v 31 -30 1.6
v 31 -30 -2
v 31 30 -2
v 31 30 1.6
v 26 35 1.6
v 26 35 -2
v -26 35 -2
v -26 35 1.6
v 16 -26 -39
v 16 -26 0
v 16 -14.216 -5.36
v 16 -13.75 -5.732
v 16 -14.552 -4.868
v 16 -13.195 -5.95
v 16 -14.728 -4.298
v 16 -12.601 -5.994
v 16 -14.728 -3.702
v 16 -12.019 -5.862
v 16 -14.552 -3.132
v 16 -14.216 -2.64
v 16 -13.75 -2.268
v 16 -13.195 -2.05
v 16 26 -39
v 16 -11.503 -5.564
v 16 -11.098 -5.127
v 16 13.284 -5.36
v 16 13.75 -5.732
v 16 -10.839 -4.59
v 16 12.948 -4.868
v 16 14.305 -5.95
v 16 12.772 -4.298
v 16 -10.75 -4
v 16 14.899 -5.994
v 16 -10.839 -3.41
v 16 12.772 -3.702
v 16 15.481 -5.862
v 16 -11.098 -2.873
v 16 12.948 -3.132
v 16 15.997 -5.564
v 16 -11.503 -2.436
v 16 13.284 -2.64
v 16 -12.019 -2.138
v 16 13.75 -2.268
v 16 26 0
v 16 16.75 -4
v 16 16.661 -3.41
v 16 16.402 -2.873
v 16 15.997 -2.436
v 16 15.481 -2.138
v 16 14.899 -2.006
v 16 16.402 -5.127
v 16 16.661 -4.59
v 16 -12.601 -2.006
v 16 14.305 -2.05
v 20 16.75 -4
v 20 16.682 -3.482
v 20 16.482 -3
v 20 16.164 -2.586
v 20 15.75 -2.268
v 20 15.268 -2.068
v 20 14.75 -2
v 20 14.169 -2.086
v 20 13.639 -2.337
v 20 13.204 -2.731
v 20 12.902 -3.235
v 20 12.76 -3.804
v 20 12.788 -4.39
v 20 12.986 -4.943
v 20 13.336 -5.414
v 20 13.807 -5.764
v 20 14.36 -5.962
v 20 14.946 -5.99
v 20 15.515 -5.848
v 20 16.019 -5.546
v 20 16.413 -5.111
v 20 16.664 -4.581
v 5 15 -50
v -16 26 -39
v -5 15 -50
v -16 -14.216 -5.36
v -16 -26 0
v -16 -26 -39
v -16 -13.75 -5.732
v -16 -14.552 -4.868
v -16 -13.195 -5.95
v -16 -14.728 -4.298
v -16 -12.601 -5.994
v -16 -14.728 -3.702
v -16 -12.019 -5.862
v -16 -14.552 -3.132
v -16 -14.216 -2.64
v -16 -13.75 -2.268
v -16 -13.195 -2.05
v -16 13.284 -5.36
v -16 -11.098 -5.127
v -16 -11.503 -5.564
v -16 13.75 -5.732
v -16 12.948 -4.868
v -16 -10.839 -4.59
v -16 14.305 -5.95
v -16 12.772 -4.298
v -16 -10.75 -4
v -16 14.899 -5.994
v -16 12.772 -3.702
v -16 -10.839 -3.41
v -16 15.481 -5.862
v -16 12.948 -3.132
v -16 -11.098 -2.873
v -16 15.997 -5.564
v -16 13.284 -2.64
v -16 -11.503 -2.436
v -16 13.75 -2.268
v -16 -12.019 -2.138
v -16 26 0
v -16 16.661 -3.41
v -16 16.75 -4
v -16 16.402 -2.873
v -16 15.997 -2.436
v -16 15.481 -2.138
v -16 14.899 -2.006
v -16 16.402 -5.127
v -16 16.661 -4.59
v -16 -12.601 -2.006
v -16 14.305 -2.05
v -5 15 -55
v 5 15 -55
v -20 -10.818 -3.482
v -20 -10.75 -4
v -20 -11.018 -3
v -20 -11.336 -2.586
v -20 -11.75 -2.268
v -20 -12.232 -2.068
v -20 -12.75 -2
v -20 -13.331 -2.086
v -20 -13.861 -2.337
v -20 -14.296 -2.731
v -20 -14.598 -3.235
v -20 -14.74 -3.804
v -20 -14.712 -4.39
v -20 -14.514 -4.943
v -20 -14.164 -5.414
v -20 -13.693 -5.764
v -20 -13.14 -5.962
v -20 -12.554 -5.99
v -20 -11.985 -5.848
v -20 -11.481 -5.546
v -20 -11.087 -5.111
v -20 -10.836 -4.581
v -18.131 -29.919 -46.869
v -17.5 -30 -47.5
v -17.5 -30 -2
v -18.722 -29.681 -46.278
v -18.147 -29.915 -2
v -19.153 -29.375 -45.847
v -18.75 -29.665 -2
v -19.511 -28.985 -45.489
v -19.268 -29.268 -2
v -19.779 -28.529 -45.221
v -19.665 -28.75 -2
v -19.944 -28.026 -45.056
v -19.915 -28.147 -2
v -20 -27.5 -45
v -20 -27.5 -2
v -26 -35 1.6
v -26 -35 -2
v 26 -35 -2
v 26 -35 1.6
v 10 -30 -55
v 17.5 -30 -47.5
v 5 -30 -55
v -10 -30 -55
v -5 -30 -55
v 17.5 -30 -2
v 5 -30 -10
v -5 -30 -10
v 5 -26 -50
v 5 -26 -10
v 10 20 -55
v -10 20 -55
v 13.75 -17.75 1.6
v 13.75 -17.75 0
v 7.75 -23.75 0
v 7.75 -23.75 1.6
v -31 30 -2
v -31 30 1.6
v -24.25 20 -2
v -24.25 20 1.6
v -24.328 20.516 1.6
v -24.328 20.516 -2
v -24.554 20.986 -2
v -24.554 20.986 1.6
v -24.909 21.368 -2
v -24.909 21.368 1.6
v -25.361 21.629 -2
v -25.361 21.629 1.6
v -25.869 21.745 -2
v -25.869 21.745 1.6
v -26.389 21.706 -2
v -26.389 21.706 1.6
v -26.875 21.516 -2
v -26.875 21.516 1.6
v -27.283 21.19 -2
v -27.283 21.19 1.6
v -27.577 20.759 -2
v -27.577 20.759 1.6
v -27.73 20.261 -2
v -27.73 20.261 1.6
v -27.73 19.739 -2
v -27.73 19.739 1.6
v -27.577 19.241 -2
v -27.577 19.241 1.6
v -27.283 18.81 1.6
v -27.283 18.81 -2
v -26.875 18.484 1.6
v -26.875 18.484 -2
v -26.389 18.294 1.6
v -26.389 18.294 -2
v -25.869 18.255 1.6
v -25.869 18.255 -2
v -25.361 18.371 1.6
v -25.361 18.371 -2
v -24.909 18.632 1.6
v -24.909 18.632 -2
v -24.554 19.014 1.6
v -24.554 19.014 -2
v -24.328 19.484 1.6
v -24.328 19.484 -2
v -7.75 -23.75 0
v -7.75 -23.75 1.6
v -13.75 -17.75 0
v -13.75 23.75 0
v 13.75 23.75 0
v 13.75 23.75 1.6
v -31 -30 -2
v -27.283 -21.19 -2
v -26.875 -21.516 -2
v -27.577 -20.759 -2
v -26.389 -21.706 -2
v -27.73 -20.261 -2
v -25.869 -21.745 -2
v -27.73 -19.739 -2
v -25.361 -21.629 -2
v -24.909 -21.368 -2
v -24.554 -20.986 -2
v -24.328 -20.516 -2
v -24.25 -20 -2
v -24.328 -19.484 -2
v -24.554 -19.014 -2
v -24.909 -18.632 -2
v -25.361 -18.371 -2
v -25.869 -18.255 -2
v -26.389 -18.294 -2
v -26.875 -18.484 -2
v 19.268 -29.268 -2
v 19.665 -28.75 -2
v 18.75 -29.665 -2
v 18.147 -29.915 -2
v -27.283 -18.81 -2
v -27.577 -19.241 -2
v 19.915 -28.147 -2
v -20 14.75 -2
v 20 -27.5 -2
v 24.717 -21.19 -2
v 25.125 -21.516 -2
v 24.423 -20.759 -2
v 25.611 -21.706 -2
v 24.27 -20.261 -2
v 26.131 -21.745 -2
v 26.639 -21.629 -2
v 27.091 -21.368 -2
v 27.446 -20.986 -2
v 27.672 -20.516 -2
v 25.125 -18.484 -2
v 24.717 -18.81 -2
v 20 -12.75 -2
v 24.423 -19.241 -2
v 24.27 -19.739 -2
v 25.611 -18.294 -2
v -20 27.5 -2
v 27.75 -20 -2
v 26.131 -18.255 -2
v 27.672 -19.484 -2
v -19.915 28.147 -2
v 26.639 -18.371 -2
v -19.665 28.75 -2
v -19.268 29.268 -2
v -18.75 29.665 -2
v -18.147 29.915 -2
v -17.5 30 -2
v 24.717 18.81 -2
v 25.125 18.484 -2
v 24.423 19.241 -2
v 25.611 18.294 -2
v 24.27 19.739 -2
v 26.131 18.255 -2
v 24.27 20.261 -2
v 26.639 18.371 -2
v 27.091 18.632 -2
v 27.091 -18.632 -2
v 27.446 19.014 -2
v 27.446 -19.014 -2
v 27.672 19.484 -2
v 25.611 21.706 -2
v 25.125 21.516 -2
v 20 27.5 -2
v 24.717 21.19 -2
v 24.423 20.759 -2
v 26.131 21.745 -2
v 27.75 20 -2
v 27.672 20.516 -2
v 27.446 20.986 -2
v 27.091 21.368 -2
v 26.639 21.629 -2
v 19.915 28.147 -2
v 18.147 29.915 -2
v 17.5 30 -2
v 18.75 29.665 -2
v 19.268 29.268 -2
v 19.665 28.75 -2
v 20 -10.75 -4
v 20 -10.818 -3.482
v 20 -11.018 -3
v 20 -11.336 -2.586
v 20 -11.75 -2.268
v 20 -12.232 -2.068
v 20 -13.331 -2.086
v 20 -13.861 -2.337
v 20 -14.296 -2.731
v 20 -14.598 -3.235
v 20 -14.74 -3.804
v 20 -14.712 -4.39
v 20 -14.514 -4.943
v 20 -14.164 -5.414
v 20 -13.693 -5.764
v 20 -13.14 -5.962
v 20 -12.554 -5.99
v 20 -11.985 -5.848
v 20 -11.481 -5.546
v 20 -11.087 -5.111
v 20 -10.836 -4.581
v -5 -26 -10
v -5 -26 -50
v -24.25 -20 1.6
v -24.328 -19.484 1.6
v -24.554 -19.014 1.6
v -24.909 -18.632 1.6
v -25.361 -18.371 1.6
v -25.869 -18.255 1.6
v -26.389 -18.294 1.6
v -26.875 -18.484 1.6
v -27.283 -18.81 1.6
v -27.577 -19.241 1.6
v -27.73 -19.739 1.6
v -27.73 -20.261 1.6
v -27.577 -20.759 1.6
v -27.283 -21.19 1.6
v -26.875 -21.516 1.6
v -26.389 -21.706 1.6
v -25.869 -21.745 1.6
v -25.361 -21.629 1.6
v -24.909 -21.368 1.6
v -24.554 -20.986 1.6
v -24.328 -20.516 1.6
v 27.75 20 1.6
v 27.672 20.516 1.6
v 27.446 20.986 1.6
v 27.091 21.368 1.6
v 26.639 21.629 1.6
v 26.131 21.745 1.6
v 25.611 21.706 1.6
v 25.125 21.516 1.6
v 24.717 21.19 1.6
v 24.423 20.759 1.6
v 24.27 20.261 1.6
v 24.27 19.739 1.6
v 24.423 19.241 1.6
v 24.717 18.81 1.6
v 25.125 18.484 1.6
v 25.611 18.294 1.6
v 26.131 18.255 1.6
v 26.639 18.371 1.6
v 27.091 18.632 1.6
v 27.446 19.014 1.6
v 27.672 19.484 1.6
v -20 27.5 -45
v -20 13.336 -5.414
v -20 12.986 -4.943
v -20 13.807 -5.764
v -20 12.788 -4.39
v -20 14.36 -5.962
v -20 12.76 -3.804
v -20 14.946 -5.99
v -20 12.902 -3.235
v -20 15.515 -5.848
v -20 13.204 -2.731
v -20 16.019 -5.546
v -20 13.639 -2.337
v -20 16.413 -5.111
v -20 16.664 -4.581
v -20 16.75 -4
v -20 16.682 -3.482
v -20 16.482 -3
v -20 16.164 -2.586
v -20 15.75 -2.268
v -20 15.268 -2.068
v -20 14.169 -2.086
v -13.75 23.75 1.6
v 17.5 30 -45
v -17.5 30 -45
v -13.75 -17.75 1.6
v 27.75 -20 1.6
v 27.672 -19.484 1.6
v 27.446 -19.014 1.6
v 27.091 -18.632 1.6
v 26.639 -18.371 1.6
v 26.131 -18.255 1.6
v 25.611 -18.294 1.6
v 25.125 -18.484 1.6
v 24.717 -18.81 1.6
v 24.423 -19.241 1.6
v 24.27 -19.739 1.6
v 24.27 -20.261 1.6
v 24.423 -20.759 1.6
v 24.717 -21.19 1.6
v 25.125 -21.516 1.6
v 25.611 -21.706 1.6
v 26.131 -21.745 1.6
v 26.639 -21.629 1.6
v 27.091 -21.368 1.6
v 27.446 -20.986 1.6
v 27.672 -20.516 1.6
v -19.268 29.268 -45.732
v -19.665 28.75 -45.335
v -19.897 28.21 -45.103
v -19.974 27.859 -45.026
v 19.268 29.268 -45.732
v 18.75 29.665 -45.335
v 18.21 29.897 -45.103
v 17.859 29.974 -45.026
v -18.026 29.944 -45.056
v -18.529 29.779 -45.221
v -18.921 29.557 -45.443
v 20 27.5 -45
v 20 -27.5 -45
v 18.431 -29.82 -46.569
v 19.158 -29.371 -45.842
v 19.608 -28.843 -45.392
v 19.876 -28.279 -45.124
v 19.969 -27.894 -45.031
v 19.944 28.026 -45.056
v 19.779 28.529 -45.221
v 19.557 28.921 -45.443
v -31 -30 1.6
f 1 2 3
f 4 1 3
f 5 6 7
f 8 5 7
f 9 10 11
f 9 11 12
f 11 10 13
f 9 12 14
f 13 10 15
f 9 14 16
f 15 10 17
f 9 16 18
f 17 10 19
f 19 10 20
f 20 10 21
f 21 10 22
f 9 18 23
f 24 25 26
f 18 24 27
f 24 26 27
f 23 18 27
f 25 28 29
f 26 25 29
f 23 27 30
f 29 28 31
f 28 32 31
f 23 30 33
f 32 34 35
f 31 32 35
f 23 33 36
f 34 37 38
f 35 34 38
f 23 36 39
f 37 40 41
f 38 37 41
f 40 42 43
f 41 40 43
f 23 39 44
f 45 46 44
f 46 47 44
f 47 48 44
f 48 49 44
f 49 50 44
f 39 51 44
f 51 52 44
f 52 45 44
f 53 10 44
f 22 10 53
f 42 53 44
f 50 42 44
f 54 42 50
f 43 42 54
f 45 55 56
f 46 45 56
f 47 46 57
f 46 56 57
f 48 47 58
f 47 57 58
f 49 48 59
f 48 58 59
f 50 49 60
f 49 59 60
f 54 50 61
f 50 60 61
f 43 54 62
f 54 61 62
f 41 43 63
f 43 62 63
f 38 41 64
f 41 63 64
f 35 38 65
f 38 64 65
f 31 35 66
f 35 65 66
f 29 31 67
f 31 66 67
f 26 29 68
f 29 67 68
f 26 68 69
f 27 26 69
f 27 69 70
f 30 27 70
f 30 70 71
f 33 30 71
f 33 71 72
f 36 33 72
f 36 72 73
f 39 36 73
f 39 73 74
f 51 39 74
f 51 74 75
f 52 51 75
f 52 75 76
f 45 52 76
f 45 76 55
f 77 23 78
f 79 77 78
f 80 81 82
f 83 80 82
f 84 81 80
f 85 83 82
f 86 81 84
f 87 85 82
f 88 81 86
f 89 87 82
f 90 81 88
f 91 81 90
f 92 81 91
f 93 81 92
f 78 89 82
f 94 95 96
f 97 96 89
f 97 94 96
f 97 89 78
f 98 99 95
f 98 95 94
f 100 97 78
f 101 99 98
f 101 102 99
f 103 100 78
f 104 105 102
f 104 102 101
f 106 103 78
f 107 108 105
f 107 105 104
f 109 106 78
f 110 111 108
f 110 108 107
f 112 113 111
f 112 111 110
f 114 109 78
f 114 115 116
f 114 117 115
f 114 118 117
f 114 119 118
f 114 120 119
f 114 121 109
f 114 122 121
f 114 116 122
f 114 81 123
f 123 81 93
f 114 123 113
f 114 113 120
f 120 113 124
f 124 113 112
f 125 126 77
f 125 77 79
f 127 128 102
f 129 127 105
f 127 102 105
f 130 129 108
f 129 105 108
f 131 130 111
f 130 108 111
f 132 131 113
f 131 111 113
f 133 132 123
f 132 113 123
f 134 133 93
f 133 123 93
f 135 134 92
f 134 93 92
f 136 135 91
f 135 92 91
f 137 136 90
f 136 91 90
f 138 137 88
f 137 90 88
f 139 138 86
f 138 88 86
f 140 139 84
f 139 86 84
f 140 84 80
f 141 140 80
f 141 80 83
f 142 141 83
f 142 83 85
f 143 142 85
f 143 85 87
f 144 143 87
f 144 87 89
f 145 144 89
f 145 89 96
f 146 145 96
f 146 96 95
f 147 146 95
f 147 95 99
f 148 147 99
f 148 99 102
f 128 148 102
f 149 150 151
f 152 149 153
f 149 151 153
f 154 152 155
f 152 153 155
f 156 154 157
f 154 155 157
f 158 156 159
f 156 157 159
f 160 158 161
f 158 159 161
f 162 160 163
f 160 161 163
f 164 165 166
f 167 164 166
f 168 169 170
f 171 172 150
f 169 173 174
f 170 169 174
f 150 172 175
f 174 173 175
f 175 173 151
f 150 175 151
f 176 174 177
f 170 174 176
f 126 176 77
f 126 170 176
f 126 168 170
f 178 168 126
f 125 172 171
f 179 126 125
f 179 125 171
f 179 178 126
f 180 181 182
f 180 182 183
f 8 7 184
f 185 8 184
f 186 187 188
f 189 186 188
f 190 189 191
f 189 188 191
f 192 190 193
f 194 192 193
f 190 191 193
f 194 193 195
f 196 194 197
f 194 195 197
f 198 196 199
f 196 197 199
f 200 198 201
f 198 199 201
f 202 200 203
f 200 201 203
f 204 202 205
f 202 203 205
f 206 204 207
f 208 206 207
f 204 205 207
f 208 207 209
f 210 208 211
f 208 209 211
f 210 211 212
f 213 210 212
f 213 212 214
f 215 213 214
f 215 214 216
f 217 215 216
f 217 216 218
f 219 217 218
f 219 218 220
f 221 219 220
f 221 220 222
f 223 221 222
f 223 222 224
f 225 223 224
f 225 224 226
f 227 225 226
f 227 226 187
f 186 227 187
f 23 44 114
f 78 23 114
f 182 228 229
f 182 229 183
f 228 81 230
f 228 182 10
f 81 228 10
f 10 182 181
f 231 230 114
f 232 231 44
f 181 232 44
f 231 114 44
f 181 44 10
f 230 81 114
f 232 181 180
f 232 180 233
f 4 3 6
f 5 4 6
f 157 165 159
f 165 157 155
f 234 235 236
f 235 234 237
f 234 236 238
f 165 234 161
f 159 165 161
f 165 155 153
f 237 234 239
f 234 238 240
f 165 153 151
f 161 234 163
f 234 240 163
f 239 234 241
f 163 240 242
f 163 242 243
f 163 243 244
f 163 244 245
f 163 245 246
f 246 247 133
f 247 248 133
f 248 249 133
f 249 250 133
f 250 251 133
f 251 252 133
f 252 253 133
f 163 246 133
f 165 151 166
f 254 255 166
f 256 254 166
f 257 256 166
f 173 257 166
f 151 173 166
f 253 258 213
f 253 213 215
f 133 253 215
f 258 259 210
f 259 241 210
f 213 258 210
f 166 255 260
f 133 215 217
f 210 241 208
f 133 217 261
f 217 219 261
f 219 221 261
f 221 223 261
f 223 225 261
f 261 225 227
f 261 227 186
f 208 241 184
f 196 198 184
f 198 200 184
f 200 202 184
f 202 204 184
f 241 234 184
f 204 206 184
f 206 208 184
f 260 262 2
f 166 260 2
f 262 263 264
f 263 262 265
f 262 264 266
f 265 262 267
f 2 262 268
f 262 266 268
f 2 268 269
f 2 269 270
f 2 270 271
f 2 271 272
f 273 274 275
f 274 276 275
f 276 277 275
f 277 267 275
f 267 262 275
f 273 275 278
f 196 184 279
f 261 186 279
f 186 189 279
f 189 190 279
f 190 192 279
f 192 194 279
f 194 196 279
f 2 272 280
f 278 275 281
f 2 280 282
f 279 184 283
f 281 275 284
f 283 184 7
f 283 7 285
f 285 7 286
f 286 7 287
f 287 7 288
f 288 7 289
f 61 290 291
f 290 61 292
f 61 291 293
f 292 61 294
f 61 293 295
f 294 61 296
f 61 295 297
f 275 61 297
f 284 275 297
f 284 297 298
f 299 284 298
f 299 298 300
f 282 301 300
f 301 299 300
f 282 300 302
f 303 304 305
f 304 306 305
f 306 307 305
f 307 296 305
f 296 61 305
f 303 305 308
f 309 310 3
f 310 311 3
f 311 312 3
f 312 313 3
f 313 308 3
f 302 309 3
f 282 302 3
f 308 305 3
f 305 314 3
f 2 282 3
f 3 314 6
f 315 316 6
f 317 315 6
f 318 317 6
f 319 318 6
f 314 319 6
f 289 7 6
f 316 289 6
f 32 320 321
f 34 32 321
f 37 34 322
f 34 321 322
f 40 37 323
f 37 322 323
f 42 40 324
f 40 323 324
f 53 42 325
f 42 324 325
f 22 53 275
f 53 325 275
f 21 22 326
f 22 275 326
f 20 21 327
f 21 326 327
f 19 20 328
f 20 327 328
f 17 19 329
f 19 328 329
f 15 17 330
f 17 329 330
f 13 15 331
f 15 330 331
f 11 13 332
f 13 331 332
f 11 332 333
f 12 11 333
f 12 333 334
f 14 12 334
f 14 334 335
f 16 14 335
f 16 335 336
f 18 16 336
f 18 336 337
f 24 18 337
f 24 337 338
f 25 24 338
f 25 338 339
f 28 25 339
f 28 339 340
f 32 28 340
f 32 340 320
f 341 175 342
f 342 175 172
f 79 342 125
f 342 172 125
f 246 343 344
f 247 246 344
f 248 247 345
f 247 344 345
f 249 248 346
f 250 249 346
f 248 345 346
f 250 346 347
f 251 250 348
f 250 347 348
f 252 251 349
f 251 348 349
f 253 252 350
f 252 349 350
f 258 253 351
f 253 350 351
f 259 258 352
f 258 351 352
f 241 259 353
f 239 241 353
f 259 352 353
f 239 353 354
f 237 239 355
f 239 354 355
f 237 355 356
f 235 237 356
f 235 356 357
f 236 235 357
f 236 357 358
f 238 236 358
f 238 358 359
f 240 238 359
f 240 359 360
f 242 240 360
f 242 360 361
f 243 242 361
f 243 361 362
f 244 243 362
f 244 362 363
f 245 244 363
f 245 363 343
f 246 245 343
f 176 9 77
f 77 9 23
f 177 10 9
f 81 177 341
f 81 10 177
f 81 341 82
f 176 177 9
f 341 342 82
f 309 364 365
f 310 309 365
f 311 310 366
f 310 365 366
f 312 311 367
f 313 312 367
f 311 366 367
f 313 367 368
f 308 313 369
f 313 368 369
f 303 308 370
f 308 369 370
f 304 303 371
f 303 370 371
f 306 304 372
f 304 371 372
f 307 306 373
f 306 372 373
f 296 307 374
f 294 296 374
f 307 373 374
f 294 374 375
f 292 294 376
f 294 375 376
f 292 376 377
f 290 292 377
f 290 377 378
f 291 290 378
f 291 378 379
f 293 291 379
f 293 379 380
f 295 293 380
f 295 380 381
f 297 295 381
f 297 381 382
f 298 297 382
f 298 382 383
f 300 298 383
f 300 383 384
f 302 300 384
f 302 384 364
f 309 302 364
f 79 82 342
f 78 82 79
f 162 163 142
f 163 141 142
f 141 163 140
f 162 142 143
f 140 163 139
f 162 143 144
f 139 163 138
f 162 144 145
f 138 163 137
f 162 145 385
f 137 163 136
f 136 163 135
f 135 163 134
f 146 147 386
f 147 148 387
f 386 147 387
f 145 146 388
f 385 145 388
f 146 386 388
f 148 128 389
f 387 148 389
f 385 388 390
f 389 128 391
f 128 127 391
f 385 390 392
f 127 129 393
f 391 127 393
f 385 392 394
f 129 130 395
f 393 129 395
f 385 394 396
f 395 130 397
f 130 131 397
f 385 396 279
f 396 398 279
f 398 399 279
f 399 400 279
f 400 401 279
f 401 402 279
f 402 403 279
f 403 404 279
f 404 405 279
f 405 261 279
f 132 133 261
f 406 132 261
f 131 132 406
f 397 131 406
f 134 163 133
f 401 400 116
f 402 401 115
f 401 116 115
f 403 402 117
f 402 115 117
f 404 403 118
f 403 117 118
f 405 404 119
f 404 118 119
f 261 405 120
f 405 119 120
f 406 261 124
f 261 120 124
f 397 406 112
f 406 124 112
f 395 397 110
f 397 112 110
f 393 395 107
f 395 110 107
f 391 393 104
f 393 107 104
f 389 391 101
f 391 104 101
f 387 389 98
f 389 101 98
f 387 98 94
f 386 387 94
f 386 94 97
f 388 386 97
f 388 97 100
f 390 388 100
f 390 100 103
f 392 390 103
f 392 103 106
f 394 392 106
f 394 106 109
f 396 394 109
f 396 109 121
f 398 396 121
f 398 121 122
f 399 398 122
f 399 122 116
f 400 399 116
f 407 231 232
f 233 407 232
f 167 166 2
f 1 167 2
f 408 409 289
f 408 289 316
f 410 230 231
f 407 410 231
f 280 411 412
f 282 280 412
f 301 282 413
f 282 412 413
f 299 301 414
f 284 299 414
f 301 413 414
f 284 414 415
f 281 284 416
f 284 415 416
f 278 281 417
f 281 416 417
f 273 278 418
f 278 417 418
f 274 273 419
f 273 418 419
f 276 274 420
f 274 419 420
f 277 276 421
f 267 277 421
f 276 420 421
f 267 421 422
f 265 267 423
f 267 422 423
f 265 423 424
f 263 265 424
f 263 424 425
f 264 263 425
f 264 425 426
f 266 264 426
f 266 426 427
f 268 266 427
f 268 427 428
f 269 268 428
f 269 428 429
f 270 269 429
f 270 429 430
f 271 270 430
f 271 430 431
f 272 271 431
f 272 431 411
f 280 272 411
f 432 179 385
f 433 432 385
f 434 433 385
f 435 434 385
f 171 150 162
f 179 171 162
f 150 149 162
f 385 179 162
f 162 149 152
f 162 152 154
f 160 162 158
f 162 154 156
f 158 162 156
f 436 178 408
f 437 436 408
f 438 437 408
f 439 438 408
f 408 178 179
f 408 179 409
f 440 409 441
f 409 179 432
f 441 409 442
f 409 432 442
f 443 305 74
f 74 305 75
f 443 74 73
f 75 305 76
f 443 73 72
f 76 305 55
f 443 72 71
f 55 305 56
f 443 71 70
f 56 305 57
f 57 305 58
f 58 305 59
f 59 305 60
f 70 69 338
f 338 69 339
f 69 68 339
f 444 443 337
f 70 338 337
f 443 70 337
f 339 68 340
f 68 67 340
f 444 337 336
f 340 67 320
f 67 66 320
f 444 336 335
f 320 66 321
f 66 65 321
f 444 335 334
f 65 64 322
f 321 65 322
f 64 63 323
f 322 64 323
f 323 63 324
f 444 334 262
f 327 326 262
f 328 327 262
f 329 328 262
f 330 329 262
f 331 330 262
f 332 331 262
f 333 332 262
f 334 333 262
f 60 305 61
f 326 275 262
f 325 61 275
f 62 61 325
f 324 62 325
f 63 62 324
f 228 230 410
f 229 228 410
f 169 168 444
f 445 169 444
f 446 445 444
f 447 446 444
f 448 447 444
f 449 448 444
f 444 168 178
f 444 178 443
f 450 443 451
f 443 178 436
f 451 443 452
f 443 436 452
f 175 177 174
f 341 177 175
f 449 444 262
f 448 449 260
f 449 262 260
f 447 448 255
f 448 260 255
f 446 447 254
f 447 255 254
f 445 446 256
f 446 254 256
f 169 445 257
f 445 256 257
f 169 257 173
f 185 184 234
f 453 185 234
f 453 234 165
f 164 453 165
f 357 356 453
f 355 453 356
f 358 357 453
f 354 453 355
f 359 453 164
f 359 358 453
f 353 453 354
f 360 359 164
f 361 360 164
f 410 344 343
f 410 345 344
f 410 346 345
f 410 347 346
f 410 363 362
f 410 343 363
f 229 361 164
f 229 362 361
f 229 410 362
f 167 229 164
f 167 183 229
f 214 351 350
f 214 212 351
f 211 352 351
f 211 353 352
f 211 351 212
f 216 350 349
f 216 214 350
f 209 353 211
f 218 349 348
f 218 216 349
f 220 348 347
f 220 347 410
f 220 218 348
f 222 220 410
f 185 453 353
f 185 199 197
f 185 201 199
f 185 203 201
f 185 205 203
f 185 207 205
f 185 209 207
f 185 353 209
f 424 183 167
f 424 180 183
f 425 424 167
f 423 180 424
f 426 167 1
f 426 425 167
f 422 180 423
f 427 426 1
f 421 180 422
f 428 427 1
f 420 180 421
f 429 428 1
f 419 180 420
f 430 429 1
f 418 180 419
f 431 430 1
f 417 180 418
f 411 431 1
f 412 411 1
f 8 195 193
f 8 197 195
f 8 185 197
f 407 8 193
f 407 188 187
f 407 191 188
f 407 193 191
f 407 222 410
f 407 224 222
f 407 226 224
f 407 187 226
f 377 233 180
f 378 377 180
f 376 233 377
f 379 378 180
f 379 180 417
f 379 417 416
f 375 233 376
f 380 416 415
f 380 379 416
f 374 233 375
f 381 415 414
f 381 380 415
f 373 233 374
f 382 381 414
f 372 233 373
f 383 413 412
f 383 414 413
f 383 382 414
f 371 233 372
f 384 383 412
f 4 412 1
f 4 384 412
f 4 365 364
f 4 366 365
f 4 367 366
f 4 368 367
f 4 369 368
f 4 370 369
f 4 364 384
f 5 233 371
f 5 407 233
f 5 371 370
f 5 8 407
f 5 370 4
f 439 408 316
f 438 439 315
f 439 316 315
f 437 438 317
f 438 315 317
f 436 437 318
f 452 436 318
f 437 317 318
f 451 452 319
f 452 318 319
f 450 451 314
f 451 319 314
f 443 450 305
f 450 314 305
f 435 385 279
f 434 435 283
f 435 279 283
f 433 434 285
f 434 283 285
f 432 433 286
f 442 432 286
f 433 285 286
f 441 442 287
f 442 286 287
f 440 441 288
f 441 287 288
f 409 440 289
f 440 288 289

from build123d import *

# Parameters (mm, degrees)
SKETCH1_W           = 62
SKETCH1_H           = 70
SKETCH1_W_2         = 27.5
SKETCH1_H_2         = 47.5
BOSS_EXTRUDE1_DEPTH = 1.6
CHAMFER1_SIZE       = 5
CHAMFER2_SIZE       = 6
SKETCH3_W           = 32
SKETCH3_H           = 52
BOSS_EXTRUDE2_DEPTH = 50
BOSS_EXTRUDE3_DEPTH = 5
SKETCH5_W           = 10
SKETCH5_H           = 45
CUT_EXTRUDE1_DEPTH  = 45
CHAMFER3_SIZE       = 11
CHAMFER4_SIZE       = 10
SKETCH7_R           = 2
CUT_EXTRUDE2_DEPTH  = 83.770767787
MOVE_START          = -2
MOVE_FACE1_DEPTH    = 2
SKETCH8_R           = 1.75
CUT_EXTRUDE3_DEPTH  = 74.413622714


# Read off the part's stored shape, not the designer's step: Move Face1
# Some blends are built 0.0001 mm under size
with BuildPart() as part:
    # Sketch1 → Boss-Extrude1 (new body)
    with BuildSketch(Plane.XY):
        Rectangle(SKETCH1_W, SKETCH1_H)
        Rectangle(SKETCH1_W_2, SKETCH1_H_2, mode=Mode.SUBTRACT)
    extrude(amount=BOSS_EXTRUDE1_DEPTH)

    # Chamfer1
    chamfer1_edges = [part.edges().sort_by_distance(p)[0] for p in [
        (-31, 35, 0.8),
        (31, 35, 0.8),
        (31, -35, 0.8),
        (-31, -35, 0.8),
    ]]
    chamfer(chamfer1_edges, length=CHAMFER1_SIZE)

    # Chamfer2
    chamfer2_edges = [part.edges().sort_by_distance(p)[0] for p in [
        (-13.75, -23.75, 0.8),
        (13.75, -23.75, 0.8),
    ]]
    chamfer(chamfer2_edges, length=CHAMFER2_SIZE)

    # Sketch3 → Boss-Extrude2 (add)
    with BuildSketch(Plane(origin=(0, 0, 0), x_dir=(-1, 0, 0), z_dir=(0, 0, -1))):
        with BuildLine():
            Line((-20, 27.5), (-20, -27.5))
            ThreePointArc((-20, -27.5), (-19.267766953, -29.267766953), (-17.5, -30))
            Line((-17.5, -30), (17.5, -30))
            ThreePointArc((17.5, -30), (19.267766953, -29.267766953), (20, -27.5))
            Line((20, -27.5), (20, 27.5))
            ThreePointArc((20, 27.5), (19.267766953, 29.267766953), (17.5, 30))
            Line((17.5, 30), (-17.5, 30))
            ThreePointArc((-17.5, 30), (-19.267766953, 29.267766953), (-20, 27.5))
        make_face()
        Rectangle(SKETCH3_W, SKETCH3_H, mode=Mode.SUBTRACT)
    extrude(amount=BOSS_EXTRUDE2_DEPTH)

    # Sketch4 → Boss-Extrude3 (add)
    with BuildSketch(Plane(origin=(0, 0, -50), x_dir=(-1, 0, 0), z_dir=(0, 0, -1))):
        with BuildLine():
            Line((17.5, 30), (-17.5, 30))
            ThreePointArc((-17.5, 30), (-19.267766953, 29.267766953), (-20, 27.5))
            Line((-20, 27.5), (-20, -27.5))
            ThreePointArc((-20, -27.5), (-19.267766953, -29.267766953), (-17.5, -30))
            Line((-17.5, -30), (17.5, -30))
            ThreePointArc((17.5, -30), (19.267766953, -29.267766953), (20, -27.5))
            Line((20, -27.5), (20, 27.5))
            ThreePointArc((20, 27.5), (19.267766953, 29.267766953), (17.5, 30))
        make_face()
    extrude(amount=BOSS_EXTRUDE3_DEPTH)

    # Sketch5 → Cut-Extrude1 (cut)
    with BuildSketch(Plane(origin=(0, 0, -55), x_dir=(-1, 0, 0), z_dir=(0, 0, -1))):
        with Locations((0, -7.5)):
            Rectangle(SKETCH5_W, SKETCH5_H)
    extrude(amount=-CUT_EXTRUDE1_DEPTH, mode=Mode.SUBTRACT)

    # Chamfer3
    chamfer3_edges = [part.edges().sort_by_distance(p)[0] for p in [
        (-16, 0, -50),
        (0, 26, -50),
        (16, 0, -50),
    ]]
    chamfer(chamfer3_edges, length=CHAMFER3_SIZE - 0.0001)  # a hair under: the kernel refuses the full size

    # Chamfer4
    # the kernel refuses this chamfer: 10 mm, written as the material it takes off along each edge
    with BuildSketch(Plane(origin=(-43.21682988, 30, -55), x_dir=(0, -0.9996219169112968, -0.027495876610586317), z_dir=(1, 0, 0))) as chamfer4_piece_1:
        Polygon((CHAMFER4_SIZE * 0.999621916911, -CHAMFER4_SIZE * 0.0274958766106), (-CHAMFER4_SIZE * 0.0274958766106, -CHAMFER4_SIZE * 0.999621916911), (0, 0), align=None)
    extrude(amount=86.433659759, mode=Mode.SUBTRACT)
    with BuildSketch(Plane(origin=(20, 53.21682988, -55), x_dir=(-0.9996219169112968, 0, -0.027495876610586317), z_dir=(0, -1, 0)), Plane(origin=(-20, -53.21682988, -55), x_dir=(0.9996219169112968, 0, -0.027495876610586317), z_dir=(0, 1, 0))) as chamfer4_piece_2:
        Polygon((CHAMFER4_SIZE * 0.999621916911, -CHAMFER4_SIZE * 0.0274958766106), (-CHAMFER4_SIZE * 0.0274958766106, -CHAMFER4_SIZE * 0.999621916911), (0, 0), align=None)
    extrude(amount=106.433659759, mode=Mode.SUBTRACT)

    # Sketch7 → Cut-Extrude2 (cut, through all)
    with BuildSketch(Plane(origin=(20, 0, 0), x_dir=(0, 0, -1), z_dir=(1, 0, 0))):
        with Locations(Location((4, 14.75, 0), (0, 0, 90))):
            Circle(SKETCH7_R)
        with Locations(Location((4, -12.75, 0), (0, 0, 90))):
            Circle(SKETCH7_R)
    extrude(amount=-CUT_EXTRUDE2_DEPTH, mode=Mode.SUBTRACT)

    # Move Face1 outline → Move Face1 (add)
    with BuildSketch(Plane.XY.offset(MOVE_START)):
        Polygon((-31, 30), (-31, -30), (-26, -35), (26, -35), (31, -30), (31, 30), (26, 35), (-26, 35), align=None)
        with BuildLine():
            ThreePointArc((-20, 27.5), (-19.267766953, 29.267766953), (-17.5, 30))
            Line((-17.5, 30), (17.5, 30))
            ThreePointArc((17.5, 30), (19.267766953, 29.267766953), (20, 27.5))
            Line((20, 27.5), (20, -27.5))
            ThreePointArc((20, -27.5), (19.267766953, -29.267766953), (17.5, -30))
            Line((17.5, -30), (-17.5, -30))
            ThreePointArc((-17.5, -30), (-19.267766953, -29.267766953), (-20, -27.5))
            Line((-20, -27.5), (-20, 27.5))
        make_face(mode=Mode.SUBTRACT)
    extrude(amount=MOVE_FACE1_DEPTH)

    # Sketch8 → Cut-Extrude3 (cut, through all)
    with BuildSketch(Plane.XY.offset(1.6)):
        with Locations((26, 20)):
            Circle(SKETCH8_R)
        with Locations((26, -20)):
            Circle(SKETCH8_R)
        with Locations((-26, -20)):
            Circle(SKETCH8_R)
        with Locations((-26, 20)):
            Circle(SKETCH8_R)
    extrude(amount=-CUT_EXTRUDE3_DEPTH, mode=Mode.SUBTRACT)


solid = part.part
